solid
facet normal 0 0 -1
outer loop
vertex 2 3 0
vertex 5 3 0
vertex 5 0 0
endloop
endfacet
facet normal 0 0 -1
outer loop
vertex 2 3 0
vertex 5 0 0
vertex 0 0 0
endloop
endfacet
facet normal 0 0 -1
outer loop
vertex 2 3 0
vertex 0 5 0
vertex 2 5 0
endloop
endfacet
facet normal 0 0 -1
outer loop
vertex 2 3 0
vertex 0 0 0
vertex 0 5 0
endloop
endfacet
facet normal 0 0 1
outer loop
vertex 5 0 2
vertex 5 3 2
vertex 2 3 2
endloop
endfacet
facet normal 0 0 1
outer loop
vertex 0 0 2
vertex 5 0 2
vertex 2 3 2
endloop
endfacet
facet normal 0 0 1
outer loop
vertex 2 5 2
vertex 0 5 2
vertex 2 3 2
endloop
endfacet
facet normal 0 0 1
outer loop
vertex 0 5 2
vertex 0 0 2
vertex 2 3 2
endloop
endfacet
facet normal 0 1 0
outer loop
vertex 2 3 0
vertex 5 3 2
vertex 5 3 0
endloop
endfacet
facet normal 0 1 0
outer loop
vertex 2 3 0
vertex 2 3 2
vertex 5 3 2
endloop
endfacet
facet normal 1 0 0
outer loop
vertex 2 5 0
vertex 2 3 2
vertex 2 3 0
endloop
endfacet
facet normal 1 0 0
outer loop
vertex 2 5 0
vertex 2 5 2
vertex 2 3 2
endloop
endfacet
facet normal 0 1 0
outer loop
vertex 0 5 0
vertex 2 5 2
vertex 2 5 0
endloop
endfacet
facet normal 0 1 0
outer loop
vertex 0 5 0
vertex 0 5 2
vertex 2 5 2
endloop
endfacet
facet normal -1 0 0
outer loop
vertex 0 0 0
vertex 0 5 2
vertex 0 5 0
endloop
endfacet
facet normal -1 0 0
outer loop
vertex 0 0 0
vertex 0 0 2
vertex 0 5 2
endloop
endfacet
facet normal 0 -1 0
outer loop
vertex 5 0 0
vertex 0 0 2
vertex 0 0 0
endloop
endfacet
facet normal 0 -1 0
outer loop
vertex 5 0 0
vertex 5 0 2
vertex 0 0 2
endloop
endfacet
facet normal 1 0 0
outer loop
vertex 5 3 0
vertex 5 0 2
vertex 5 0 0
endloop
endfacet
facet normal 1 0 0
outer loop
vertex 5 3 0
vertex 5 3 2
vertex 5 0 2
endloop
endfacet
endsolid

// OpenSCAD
linear_extrude(height = 2)
  polygon(points = [[0, 0], [5, 0], [5, 3], [2, 3], [2, 5], [0, 5]]);
